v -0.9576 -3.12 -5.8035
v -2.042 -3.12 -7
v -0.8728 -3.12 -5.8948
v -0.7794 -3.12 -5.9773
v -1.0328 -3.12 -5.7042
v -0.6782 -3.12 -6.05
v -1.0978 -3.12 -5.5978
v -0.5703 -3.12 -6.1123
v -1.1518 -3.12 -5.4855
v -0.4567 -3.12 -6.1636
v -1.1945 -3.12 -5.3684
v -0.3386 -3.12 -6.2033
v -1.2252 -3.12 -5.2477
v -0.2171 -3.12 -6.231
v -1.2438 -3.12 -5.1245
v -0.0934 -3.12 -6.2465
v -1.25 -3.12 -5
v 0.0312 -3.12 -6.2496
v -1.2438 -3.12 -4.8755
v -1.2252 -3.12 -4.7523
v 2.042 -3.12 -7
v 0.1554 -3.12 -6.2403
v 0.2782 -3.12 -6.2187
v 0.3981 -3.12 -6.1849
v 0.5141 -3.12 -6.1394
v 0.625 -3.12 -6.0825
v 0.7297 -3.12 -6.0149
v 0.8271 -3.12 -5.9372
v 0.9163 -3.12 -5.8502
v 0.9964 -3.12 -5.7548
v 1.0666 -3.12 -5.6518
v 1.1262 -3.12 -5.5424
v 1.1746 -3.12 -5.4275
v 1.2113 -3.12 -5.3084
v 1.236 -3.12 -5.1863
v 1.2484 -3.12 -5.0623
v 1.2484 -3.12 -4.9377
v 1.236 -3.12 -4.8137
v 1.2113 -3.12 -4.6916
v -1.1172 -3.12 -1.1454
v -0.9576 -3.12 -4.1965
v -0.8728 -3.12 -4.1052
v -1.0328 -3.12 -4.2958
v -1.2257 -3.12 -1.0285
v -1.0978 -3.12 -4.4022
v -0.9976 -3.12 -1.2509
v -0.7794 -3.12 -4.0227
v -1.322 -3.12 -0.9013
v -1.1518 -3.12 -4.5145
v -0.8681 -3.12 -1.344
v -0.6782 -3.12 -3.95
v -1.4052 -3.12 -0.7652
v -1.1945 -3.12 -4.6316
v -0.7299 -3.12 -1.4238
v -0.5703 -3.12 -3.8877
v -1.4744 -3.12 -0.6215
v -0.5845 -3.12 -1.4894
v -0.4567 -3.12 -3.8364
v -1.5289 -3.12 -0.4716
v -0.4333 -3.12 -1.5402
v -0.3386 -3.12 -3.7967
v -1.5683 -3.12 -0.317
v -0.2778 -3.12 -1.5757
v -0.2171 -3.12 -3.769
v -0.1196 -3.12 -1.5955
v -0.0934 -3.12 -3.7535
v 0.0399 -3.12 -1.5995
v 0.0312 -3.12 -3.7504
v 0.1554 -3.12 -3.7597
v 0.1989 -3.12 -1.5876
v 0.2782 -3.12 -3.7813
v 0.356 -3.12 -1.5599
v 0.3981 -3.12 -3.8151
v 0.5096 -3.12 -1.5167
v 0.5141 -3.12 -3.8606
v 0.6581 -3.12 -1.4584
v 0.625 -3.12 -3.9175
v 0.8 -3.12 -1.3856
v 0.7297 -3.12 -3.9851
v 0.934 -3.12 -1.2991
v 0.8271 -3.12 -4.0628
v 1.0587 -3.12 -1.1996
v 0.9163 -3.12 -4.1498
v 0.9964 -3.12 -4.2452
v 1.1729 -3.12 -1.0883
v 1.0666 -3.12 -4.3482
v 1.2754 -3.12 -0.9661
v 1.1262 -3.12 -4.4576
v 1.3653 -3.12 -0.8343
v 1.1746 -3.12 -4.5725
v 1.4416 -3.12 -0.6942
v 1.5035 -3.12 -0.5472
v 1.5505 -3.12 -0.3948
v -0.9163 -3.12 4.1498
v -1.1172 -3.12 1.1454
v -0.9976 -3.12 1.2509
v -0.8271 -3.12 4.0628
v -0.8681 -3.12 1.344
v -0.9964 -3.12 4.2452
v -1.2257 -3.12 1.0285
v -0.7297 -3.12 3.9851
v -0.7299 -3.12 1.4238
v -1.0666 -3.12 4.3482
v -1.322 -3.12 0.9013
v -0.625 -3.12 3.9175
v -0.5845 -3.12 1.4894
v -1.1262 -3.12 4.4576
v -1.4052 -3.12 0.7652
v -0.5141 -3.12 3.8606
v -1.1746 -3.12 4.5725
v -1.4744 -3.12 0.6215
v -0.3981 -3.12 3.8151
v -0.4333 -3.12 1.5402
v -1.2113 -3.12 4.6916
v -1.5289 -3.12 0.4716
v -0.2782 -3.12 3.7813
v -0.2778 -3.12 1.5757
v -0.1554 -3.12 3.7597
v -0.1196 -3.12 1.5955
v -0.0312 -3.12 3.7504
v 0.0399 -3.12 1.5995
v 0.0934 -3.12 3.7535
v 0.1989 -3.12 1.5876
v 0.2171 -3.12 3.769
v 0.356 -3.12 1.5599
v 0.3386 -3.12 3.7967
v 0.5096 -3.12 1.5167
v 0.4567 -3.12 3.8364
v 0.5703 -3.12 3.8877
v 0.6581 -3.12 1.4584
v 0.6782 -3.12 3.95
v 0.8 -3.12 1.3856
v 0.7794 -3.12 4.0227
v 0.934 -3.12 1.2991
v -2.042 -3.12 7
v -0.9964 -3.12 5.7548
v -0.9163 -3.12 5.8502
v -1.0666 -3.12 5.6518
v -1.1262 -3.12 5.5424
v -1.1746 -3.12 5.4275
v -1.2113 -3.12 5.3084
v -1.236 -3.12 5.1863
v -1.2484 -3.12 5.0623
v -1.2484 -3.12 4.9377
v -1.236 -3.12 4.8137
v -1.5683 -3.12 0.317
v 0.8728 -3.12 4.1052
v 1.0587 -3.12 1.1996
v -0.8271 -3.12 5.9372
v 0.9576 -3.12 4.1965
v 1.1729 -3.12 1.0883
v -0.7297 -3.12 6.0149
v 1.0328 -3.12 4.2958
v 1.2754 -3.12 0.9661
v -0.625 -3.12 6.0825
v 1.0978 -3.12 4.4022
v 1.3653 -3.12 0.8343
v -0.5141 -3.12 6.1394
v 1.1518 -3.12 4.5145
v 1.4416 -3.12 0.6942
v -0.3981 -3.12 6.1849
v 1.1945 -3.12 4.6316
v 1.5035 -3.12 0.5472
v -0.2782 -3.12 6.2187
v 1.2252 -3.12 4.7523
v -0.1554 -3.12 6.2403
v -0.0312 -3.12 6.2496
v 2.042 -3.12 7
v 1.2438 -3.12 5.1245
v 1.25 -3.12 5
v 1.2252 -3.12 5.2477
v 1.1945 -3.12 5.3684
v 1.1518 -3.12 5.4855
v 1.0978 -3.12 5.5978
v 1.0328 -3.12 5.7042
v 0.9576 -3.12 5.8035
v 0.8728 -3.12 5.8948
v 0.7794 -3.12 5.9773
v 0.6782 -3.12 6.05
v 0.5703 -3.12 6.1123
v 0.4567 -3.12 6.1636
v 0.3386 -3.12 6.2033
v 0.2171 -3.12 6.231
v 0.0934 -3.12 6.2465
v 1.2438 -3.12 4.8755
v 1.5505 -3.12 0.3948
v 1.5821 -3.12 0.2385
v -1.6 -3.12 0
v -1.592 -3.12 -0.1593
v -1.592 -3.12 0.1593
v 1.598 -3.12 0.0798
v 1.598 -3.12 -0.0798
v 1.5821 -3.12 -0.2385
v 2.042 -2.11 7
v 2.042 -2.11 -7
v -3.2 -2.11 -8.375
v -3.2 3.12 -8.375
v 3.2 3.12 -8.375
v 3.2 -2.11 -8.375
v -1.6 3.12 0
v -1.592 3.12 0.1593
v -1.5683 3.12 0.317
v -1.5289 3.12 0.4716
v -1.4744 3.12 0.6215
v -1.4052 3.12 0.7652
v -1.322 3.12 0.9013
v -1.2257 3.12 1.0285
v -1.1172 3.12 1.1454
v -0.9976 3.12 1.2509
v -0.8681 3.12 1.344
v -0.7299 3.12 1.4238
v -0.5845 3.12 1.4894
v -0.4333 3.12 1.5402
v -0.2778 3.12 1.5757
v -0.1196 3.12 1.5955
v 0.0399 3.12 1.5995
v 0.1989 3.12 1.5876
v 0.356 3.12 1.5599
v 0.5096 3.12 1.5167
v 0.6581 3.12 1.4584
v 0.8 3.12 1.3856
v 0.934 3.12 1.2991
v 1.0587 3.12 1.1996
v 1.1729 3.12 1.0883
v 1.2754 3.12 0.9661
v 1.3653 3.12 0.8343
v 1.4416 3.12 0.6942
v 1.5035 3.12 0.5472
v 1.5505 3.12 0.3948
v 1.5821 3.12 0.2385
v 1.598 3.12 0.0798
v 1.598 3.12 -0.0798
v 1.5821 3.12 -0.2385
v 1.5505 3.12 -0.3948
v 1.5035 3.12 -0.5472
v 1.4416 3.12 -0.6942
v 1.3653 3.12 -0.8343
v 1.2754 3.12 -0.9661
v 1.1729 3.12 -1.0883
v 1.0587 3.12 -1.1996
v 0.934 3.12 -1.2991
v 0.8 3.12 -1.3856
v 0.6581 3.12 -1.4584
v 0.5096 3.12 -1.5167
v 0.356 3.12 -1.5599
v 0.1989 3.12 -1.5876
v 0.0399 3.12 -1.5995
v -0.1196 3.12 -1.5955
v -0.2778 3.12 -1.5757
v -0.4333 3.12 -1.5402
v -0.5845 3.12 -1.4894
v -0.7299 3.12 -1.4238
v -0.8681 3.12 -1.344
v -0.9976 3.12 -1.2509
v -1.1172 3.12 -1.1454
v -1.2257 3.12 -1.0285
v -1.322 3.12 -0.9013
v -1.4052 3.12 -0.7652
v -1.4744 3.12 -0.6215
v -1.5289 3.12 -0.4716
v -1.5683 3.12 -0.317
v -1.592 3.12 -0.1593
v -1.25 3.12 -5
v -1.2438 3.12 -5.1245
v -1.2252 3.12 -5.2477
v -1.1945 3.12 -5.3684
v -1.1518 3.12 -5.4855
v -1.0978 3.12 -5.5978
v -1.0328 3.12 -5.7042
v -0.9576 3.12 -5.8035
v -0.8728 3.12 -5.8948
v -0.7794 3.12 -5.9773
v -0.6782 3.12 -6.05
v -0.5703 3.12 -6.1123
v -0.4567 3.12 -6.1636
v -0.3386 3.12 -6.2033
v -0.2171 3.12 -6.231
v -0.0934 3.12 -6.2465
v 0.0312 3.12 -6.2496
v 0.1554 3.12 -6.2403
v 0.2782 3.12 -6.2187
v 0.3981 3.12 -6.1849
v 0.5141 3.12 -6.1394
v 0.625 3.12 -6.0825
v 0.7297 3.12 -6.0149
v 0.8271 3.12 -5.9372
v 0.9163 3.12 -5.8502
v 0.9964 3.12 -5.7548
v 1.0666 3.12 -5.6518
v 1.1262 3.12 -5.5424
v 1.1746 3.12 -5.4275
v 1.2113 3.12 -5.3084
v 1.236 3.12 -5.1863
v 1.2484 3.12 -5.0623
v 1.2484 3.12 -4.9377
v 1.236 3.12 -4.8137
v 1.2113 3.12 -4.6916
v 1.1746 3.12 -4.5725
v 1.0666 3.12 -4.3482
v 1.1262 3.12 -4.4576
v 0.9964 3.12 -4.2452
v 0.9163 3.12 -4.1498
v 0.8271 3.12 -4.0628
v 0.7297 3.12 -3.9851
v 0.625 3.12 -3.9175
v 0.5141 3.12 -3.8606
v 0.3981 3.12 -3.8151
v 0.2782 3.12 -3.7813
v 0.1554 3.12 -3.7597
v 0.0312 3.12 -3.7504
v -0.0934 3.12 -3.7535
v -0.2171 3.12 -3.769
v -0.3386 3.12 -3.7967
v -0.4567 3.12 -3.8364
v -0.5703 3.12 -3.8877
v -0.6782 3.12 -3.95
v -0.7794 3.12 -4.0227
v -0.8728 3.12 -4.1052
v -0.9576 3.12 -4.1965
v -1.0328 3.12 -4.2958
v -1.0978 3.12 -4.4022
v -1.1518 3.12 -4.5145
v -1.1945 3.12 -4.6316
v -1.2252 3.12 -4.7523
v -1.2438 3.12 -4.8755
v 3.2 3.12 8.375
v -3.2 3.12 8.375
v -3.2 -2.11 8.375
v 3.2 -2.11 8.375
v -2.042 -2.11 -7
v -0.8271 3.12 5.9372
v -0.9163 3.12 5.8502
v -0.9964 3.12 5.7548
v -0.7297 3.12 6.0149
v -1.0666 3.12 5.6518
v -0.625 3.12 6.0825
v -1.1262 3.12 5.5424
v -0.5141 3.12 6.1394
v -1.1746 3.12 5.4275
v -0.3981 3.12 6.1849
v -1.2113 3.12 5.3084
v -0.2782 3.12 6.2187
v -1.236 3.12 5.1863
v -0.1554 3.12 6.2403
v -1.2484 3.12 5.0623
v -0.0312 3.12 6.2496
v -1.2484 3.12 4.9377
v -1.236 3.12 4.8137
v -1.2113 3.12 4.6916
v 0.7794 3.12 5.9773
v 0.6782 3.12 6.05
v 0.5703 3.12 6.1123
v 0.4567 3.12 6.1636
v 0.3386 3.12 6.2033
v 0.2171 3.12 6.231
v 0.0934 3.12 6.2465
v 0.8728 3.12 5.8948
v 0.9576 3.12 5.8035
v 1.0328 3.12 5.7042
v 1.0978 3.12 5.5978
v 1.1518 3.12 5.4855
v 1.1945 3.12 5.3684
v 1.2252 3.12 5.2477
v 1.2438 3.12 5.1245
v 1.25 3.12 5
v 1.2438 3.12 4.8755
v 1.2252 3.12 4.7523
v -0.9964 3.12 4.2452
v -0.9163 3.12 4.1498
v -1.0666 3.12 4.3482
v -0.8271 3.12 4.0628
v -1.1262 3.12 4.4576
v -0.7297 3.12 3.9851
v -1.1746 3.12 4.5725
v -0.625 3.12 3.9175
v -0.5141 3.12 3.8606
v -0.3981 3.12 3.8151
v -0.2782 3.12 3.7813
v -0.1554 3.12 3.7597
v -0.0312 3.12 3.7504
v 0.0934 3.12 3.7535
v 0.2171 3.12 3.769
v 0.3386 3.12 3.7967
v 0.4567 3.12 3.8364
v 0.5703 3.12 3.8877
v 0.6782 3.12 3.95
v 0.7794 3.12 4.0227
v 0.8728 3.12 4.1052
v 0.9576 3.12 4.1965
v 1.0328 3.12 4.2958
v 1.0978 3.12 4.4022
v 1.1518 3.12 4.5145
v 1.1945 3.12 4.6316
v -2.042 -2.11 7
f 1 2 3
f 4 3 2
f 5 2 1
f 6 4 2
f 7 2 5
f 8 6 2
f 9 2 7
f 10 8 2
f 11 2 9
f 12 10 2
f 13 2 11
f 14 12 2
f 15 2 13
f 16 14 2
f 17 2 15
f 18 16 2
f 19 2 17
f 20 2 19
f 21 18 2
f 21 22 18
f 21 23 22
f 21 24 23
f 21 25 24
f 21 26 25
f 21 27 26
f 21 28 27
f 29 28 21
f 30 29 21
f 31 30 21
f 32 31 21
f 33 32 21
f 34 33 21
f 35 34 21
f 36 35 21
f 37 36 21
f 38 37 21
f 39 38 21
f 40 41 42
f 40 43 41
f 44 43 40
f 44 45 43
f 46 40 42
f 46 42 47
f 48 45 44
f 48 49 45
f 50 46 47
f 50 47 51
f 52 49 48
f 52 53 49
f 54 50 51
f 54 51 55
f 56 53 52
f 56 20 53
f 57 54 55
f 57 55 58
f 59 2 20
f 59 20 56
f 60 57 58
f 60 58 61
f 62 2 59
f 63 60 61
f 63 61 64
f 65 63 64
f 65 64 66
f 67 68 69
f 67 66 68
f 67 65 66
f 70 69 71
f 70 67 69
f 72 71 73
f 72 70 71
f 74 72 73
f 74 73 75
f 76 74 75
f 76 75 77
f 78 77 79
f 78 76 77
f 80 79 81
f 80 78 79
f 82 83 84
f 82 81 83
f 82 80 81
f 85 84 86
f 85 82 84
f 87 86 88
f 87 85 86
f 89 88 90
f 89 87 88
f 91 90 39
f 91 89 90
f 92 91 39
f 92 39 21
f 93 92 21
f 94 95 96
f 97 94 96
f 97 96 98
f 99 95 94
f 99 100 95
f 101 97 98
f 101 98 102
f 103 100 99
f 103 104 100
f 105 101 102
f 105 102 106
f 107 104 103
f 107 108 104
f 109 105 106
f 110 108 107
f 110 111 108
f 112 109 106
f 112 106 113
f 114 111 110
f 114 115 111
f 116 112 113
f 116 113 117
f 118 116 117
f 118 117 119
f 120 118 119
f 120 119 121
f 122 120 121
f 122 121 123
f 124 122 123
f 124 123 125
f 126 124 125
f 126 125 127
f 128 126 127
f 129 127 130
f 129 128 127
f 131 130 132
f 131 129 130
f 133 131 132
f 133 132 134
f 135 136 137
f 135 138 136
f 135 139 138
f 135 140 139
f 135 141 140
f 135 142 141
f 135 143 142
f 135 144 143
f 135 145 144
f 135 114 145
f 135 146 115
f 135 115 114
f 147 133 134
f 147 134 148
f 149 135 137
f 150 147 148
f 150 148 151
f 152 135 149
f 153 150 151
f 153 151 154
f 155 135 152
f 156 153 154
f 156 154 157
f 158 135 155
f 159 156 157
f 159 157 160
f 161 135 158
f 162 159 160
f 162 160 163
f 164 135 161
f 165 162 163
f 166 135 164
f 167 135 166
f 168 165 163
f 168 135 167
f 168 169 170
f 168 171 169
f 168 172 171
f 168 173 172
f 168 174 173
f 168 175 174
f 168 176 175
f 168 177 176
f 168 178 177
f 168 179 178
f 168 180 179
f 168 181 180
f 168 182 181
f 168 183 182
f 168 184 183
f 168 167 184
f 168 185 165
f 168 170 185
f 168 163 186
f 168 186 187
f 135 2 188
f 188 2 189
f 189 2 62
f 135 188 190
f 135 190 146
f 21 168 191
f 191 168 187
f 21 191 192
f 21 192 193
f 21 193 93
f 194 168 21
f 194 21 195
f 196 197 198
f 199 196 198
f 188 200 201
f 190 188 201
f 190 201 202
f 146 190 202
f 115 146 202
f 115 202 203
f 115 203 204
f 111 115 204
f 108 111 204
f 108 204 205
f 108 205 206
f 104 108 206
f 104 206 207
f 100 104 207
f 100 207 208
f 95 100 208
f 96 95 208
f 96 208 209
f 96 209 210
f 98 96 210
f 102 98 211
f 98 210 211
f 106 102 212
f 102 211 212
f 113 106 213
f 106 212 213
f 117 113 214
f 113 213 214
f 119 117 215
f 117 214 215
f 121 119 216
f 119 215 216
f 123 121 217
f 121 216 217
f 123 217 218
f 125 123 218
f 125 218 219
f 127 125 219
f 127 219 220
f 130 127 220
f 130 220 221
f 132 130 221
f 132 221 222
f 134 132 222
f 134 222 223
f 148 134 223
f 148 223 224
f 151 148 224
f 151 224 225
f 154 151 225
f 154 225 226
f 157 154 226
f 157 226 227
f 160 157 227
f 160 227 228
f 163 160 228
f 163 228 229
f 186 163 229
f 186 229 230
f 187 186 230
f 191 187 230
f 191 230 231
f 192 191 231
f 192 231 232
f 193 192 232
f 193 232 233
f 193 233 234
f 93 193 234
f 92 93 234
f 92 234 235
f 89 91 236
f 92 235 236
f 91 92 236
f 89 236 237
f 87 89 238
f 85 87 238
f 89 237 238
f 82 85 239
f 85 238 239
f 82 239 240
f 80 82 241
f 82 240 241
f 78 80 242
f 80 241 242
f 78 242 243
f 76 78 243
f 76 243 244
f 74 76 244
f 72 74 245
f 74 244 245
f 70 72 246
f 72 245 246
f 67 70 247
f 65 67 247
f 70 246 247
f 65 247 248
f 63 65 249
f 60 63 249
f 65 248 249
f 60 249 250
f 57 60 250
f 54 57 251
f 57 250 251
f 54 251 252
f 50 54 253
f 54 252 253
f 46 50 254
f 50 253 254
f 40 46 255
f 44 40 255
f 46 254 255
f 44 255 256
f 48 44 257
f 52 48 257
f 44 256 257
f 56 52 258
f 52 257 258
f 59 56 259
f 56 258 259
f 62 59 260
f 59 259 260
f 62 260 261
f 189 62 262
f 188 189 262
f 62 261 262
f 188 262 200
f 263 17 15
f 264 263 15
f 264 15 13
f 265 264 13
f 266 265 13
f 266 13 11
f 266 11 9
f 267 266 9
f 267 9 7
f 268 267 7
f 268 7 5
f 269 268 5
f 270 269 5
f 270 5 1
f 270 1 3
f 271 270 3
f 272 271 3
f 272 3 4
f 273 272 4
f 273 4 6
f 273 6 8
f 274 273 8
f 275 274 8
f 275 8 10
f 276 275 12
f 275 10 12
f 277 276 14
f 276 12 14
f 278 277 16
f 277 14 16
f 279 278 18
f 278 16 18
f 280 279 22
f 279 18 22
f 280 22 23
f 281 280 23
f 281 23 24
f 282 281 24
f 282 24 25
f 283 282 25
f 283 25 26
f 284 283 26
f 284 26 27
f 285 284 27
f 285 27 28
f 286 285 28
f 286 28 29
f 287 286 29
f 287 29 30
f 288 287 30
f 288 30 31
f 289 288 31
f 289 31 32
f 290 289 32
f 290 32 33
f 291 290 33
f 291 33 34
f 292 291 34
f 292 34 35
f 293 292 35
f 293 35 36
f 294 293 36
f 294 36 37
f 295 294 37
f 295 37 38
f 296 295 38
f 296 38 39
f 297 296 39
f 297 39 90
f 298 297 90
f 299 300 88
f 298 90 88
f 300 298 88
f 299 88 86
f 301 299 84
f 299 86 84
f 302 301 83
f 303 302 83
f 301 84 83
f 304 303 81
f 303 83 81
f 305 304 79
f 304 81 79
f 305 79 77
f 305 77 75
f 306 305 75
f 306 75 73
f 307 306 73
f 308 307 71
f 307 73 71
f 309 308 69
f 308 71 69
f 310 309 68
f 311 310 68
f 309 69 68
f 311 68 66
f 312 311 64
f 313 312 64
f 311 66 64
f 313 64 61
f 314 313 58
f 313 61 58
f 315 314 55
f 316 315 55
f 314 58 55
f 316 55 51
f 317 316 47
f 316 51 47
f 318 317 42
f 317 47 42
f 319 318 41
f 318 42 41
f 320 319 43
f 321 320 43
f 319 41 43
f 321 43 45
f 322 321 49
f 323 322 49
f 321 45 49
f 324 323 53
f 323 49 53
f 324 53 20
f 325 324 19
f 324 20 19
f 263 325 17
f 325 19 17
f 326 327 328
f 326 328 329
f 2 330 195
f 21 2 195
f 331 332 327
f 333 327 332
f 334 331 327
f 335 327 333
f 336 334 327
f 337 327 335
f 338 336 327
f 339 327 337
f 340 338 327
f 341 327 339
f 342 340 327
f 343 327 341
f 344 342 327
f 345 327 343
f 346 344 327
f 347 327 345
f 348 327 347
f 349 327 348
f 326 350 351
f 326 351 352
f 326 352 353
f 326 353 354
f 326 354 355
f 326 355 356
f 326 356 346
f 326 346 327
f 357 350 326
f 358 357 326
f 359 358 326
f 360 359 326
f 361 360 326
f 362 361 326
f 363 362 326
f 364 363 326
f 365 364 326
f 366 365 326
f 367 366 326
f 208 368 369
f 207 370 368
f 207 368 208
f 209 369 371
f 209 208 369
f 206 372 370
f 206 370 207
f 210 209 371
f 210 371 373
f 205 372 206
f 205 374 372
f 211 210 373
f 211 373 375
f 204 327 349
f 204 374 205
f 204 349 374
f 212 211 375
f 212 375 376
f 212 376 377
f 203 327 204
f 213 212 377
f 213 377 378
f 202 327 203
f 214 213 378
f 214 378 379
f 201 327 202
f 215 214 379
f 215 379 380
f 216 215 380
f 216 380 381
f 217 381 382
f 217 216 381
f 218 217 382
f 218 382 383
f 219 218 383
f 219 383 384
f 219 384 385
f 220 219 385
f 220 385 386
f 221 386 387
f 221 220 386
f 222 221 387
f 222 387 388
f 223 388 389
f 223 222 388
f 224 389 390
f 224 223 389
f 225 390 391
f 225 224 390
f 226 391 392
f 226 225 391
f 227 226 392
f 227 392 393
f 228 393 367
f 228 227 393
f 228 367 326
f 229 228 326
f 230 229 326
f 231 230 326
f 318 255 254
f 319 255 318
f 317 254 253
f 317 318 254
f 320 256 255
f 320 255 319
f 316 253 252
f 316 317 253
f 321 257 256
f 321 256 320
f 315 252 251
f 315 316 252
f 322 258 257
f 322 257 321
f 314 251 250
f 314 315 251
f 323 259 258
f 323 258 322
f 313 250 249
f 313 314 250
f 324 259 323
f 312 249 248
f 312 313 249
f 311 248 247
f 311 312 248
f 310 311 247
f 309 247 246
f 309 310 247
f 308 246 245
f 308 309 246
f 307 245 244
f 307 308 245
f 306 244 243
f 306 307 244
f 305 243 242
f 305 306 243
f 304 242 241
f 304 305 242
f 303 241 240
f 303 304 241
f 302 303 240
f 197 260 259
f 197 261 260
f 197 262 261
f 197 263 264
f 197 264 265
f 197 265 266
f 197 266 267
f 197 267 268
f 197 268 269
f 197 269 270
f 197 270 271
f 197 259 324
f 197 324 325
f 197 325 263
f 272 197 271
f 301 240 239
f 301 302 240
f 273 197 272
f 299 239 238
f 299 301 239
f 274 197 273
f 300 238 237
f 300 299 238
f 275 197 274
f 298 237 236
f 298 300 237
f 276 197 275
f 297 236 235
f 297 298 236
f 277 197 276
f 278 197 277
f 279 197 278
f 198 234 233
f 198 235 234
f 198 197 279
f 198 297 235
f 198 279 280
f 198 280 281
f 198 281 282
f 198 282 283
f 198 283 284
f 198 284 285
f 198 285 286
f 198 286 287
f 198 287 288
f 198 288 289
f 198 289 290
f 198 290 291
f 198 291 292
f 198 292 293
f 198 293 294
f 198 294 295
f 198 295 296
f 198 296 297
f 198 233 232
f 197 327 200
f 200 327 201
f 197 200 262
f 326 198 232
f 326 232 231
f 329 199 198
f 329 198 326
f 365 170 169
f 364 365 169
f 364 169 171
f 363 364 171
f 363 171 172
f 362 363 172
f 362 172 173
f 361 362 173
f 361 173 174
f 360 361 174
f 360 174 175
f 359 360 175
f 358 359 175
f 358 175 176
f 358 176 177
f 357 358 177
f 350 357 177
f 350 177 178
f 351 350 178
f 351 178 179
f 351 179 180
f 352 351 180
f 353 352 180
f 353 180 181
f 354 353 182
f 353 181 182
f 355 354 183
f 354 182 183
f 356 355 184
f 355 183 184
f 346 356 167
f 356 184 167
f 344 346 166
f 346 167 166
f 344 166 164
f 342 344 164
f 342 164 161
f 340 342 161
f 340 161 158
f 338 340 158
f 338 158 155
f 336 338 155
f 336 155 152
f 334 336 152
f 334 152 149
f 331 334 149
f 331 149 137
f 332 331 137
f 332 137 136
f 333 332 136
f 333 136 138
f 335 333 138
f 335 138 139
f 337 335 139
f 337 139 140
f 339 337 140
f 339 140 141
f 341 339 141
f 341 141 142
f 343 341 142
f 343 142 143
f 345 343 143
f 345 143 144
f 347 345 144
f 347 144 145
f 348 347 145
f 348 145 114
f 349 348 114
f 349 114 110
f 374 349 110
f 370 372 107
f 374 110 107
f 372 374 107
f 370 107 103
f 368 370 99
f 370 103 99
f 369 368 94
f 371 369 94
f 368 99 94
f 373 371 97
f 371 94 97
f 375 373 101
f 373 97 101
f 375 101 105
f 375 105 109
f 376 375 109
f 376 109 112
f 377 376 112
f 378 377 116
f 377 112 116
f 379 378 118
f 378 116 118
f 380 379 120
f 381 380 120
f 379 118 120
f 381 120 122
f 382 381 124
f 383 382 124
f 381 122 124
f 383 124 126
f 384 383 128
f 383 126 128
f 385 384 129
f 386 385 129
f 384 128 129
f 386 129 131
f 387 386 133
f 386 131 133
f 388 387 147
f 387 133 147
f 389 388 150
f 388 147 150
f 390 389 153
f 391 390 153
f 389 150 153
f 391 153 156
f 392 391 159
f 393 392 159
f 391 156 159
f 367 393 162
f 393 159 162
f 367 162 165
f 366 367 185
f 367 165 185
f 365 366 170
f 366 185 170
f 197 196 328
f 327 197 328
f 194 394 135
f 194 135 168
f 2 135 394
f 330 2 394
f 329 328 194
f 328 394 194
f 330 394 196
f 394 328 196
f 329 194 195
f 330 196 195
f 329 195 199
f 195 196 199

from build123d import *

# Parameters (mm, degrees)
SKETCH1_W             = 4.084
SKETCH1_H             = 6.24
EXTRUDE1_DEPTH        = 7
SKETCH6_W             = 6.834
SKETCH6_H             = 16.75
EXTRUDE2_DEPTH        = 5.23
F_4_CLEARANCE_HOLE1_D = 3.2
SKETCH3_R             = 1.25
CUT_EXTRUDE1_DEPTH    = 7.24
SKETCH7_W             = 0.217
SKETCH7_H             = 16.75
EXTRUDE3_DEPTH        = 6.23


with BuildPart() as part:
    # Sketch1 → Extrude1 (new body, symmetric)
    with BuildSketch(Plane.XY):
        Rectangle(SKETCH1_W, SKETCH1_H)
    extrude(amount=EXTRUDE1_DEPTH, both=True)

    # Sketch6 → Extrude2 (add)
    with BuildSketch(Plane(origin=(0, 3.12, 0), x_dir=(1, 0, 0), z_dir=(0, 1, 0))):
        Rectangle(SKETCH6_W, SKETCH6_H)
    extrude(amount=-EXTRUDE2_DEPTH)

    # 4 Clearance Hole1 (through all)
    with Locations(Plane(origin=(0.396685659, -3.12, 2.776888518), x_dir=(1, 0, 0), z_dir=(0, -1, 0))):
        with Locations((-0.396685659, -2.776888518)):
            Hole(F_4_CLEARANCE_HOLE1_D / 2)

    # Sketch3 → Cut-Extrude1 (cut, through all)
    with BuildSketch(Plane(origin=(0, -3.12, 0), x_dir=(-1, 0, 0), z_dir=(0, -1, 0))):
        with Locations(Location((0, -5, 0), (0, 0, 180))):  # turned: the seam where the file's is
            Circle(SKETCH3_R)
        with Locations((0, 5)):
            Circle(SKETCH3_R)
    extrude(amount=-CUT_EXTRUDE1_DEPTH, mode=Mode.SUBTRACT)

    # Sketch7 → Extrude3 (cut, through all)
    with BuildSketch(Plane.XZ.offset(2.11)):
        with Locations((3.3085, 0)):
            Rectangle(SKETCH7_W, SKETCH7_H)
    extrude3 = extrude(amount=-EXTRUDE3_DEPTH, mode=Mode.SUBTRACT)

    # Mirror1: Extrude3 across plane
    add(extrude3.mirror(Plane(origin=(0, 0, 0), x_dir=(0, 0, 1), z_dir=(1, 0, 0))), mode=Mode.SUBTRACT)


solid = part.part
